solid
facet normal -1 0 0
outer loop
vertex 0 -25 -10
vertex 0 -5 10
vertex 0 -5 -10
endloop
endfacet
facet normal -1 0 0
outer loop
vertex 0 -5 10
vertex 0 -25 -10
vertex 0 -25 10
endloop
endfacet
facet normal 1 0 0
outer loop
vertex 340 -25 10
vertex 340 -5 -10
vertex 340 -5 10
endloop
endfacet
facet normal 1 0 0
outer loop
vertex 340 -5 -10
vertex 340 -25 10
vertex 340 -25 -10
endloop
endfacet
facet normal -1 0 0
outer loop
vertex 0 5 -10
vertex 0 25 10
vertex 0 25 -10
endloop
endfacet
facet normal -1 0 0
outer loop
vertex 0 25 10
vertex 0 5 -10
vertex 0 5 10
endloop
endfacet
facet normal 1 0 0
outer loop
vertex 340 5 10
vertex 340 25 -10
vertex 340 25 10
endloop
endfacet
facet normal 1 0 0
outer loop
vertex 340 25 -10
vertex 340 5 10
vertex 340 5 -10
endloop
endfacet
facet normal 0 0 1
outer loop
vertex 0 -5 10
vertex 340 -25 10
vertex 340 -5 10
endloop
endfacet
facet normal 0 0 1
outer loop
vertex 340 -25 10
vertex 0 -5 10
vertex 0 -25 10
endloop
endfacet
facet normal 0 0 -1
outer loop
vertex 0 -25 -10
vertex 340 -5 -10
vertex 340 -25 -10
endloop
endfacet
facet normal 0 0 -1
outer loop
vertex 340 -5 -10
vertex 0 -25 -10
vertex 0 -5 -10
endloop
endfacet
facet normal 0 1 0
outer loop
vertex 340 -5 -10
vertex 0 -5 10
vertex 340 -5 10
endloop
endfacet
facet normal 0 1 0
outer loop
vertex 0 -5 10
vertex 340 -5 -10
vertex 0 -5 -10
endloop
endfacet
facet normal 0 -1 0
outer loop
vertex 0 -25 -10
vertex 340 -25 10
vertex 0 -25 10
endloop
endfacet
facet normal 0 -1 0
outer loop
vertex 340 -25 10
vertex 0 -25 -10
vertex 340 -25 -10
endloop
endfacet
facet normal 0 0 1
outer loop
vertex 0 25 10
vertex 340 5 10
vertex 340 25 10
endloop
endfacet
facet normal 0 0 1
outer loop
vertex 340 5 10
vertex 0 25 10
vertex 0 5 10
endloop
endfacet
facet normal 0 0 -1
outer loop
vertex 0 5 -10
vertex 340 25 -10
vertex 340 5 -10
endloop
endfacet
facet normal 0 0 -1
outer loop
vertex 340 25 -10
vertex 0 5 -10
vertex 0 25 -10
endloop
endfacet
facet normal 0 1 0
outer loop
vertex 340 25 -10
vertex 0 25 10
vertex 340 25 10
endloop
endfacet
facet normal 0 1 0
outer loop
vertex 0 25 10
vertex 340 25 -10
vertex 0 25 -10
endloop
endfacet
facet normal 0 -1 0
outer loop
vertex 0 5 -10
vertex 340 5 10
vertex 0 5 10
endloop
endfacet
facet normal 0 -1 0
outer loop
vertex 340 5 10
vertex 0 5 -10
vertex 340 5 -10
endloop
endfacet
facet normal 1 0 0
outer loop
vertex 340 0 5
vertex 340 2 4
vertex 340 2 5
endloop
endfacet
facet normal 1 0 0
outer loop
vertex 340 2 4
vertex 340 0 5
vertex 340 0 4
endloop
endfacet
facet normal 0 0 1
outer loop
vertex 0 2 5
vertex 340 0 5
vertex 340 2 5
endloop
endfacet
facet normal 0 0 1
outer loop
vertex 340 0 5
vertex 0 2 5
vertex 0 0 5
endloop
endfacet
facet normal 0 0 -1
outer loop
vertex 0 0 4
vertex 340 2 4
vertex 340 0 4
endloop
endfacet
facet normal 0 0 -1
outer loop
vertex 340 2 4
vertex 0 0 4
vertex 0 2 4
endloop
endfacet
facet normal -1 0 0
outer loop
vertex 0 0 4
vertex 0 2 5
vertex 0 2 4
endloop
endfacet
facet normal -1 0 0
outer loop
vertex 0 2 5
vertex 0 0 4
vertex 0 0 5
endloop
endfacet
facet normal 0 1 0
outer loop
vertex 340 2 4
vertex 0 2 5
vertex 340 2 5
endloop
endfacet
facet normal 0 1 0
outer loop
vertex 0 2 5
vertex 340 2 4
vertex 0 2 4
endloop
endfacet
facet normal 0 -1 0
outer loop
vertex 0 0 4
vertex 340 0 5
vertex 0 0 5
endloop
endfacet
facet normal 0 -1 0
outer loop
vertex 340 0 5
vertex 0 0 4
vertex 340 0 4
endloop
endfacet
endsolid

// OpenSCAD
module assembly_preview() {
  rod_d = 8.0;
  rod_spacing = 40.0;
  rod_len = 340.0;
  
  module rods(){
    color([0.7,0.7,0.7]) {
      translate([0, -rod_spacing/2, 0]) rotate([0,90,0]) cylinder(h=rod_len, d=rod_d, center=false);
      translate([0,  rod_spacing/2, 0]) rotate([0,90,0]) cylinder(h=rod_len, d=rod_d, center=false);
    }
  }
  rods();
  color([0.3,0.3,0.3]) translate([0, -25, -10]) cube([rod_len, 20, 20], center=false);
  color([0.3,0.3,0.3]) translate([0,  5, -10]) cube([rod_len, 20, 20], center=false);
  color([0.1,0.1,0.1]) translate([0,0,rod_d/2]) cube([rod_len, 2, 1], center=false);
  // Import and position printable parts manually if you want a full assembly preview.
}
assembly_preview();
